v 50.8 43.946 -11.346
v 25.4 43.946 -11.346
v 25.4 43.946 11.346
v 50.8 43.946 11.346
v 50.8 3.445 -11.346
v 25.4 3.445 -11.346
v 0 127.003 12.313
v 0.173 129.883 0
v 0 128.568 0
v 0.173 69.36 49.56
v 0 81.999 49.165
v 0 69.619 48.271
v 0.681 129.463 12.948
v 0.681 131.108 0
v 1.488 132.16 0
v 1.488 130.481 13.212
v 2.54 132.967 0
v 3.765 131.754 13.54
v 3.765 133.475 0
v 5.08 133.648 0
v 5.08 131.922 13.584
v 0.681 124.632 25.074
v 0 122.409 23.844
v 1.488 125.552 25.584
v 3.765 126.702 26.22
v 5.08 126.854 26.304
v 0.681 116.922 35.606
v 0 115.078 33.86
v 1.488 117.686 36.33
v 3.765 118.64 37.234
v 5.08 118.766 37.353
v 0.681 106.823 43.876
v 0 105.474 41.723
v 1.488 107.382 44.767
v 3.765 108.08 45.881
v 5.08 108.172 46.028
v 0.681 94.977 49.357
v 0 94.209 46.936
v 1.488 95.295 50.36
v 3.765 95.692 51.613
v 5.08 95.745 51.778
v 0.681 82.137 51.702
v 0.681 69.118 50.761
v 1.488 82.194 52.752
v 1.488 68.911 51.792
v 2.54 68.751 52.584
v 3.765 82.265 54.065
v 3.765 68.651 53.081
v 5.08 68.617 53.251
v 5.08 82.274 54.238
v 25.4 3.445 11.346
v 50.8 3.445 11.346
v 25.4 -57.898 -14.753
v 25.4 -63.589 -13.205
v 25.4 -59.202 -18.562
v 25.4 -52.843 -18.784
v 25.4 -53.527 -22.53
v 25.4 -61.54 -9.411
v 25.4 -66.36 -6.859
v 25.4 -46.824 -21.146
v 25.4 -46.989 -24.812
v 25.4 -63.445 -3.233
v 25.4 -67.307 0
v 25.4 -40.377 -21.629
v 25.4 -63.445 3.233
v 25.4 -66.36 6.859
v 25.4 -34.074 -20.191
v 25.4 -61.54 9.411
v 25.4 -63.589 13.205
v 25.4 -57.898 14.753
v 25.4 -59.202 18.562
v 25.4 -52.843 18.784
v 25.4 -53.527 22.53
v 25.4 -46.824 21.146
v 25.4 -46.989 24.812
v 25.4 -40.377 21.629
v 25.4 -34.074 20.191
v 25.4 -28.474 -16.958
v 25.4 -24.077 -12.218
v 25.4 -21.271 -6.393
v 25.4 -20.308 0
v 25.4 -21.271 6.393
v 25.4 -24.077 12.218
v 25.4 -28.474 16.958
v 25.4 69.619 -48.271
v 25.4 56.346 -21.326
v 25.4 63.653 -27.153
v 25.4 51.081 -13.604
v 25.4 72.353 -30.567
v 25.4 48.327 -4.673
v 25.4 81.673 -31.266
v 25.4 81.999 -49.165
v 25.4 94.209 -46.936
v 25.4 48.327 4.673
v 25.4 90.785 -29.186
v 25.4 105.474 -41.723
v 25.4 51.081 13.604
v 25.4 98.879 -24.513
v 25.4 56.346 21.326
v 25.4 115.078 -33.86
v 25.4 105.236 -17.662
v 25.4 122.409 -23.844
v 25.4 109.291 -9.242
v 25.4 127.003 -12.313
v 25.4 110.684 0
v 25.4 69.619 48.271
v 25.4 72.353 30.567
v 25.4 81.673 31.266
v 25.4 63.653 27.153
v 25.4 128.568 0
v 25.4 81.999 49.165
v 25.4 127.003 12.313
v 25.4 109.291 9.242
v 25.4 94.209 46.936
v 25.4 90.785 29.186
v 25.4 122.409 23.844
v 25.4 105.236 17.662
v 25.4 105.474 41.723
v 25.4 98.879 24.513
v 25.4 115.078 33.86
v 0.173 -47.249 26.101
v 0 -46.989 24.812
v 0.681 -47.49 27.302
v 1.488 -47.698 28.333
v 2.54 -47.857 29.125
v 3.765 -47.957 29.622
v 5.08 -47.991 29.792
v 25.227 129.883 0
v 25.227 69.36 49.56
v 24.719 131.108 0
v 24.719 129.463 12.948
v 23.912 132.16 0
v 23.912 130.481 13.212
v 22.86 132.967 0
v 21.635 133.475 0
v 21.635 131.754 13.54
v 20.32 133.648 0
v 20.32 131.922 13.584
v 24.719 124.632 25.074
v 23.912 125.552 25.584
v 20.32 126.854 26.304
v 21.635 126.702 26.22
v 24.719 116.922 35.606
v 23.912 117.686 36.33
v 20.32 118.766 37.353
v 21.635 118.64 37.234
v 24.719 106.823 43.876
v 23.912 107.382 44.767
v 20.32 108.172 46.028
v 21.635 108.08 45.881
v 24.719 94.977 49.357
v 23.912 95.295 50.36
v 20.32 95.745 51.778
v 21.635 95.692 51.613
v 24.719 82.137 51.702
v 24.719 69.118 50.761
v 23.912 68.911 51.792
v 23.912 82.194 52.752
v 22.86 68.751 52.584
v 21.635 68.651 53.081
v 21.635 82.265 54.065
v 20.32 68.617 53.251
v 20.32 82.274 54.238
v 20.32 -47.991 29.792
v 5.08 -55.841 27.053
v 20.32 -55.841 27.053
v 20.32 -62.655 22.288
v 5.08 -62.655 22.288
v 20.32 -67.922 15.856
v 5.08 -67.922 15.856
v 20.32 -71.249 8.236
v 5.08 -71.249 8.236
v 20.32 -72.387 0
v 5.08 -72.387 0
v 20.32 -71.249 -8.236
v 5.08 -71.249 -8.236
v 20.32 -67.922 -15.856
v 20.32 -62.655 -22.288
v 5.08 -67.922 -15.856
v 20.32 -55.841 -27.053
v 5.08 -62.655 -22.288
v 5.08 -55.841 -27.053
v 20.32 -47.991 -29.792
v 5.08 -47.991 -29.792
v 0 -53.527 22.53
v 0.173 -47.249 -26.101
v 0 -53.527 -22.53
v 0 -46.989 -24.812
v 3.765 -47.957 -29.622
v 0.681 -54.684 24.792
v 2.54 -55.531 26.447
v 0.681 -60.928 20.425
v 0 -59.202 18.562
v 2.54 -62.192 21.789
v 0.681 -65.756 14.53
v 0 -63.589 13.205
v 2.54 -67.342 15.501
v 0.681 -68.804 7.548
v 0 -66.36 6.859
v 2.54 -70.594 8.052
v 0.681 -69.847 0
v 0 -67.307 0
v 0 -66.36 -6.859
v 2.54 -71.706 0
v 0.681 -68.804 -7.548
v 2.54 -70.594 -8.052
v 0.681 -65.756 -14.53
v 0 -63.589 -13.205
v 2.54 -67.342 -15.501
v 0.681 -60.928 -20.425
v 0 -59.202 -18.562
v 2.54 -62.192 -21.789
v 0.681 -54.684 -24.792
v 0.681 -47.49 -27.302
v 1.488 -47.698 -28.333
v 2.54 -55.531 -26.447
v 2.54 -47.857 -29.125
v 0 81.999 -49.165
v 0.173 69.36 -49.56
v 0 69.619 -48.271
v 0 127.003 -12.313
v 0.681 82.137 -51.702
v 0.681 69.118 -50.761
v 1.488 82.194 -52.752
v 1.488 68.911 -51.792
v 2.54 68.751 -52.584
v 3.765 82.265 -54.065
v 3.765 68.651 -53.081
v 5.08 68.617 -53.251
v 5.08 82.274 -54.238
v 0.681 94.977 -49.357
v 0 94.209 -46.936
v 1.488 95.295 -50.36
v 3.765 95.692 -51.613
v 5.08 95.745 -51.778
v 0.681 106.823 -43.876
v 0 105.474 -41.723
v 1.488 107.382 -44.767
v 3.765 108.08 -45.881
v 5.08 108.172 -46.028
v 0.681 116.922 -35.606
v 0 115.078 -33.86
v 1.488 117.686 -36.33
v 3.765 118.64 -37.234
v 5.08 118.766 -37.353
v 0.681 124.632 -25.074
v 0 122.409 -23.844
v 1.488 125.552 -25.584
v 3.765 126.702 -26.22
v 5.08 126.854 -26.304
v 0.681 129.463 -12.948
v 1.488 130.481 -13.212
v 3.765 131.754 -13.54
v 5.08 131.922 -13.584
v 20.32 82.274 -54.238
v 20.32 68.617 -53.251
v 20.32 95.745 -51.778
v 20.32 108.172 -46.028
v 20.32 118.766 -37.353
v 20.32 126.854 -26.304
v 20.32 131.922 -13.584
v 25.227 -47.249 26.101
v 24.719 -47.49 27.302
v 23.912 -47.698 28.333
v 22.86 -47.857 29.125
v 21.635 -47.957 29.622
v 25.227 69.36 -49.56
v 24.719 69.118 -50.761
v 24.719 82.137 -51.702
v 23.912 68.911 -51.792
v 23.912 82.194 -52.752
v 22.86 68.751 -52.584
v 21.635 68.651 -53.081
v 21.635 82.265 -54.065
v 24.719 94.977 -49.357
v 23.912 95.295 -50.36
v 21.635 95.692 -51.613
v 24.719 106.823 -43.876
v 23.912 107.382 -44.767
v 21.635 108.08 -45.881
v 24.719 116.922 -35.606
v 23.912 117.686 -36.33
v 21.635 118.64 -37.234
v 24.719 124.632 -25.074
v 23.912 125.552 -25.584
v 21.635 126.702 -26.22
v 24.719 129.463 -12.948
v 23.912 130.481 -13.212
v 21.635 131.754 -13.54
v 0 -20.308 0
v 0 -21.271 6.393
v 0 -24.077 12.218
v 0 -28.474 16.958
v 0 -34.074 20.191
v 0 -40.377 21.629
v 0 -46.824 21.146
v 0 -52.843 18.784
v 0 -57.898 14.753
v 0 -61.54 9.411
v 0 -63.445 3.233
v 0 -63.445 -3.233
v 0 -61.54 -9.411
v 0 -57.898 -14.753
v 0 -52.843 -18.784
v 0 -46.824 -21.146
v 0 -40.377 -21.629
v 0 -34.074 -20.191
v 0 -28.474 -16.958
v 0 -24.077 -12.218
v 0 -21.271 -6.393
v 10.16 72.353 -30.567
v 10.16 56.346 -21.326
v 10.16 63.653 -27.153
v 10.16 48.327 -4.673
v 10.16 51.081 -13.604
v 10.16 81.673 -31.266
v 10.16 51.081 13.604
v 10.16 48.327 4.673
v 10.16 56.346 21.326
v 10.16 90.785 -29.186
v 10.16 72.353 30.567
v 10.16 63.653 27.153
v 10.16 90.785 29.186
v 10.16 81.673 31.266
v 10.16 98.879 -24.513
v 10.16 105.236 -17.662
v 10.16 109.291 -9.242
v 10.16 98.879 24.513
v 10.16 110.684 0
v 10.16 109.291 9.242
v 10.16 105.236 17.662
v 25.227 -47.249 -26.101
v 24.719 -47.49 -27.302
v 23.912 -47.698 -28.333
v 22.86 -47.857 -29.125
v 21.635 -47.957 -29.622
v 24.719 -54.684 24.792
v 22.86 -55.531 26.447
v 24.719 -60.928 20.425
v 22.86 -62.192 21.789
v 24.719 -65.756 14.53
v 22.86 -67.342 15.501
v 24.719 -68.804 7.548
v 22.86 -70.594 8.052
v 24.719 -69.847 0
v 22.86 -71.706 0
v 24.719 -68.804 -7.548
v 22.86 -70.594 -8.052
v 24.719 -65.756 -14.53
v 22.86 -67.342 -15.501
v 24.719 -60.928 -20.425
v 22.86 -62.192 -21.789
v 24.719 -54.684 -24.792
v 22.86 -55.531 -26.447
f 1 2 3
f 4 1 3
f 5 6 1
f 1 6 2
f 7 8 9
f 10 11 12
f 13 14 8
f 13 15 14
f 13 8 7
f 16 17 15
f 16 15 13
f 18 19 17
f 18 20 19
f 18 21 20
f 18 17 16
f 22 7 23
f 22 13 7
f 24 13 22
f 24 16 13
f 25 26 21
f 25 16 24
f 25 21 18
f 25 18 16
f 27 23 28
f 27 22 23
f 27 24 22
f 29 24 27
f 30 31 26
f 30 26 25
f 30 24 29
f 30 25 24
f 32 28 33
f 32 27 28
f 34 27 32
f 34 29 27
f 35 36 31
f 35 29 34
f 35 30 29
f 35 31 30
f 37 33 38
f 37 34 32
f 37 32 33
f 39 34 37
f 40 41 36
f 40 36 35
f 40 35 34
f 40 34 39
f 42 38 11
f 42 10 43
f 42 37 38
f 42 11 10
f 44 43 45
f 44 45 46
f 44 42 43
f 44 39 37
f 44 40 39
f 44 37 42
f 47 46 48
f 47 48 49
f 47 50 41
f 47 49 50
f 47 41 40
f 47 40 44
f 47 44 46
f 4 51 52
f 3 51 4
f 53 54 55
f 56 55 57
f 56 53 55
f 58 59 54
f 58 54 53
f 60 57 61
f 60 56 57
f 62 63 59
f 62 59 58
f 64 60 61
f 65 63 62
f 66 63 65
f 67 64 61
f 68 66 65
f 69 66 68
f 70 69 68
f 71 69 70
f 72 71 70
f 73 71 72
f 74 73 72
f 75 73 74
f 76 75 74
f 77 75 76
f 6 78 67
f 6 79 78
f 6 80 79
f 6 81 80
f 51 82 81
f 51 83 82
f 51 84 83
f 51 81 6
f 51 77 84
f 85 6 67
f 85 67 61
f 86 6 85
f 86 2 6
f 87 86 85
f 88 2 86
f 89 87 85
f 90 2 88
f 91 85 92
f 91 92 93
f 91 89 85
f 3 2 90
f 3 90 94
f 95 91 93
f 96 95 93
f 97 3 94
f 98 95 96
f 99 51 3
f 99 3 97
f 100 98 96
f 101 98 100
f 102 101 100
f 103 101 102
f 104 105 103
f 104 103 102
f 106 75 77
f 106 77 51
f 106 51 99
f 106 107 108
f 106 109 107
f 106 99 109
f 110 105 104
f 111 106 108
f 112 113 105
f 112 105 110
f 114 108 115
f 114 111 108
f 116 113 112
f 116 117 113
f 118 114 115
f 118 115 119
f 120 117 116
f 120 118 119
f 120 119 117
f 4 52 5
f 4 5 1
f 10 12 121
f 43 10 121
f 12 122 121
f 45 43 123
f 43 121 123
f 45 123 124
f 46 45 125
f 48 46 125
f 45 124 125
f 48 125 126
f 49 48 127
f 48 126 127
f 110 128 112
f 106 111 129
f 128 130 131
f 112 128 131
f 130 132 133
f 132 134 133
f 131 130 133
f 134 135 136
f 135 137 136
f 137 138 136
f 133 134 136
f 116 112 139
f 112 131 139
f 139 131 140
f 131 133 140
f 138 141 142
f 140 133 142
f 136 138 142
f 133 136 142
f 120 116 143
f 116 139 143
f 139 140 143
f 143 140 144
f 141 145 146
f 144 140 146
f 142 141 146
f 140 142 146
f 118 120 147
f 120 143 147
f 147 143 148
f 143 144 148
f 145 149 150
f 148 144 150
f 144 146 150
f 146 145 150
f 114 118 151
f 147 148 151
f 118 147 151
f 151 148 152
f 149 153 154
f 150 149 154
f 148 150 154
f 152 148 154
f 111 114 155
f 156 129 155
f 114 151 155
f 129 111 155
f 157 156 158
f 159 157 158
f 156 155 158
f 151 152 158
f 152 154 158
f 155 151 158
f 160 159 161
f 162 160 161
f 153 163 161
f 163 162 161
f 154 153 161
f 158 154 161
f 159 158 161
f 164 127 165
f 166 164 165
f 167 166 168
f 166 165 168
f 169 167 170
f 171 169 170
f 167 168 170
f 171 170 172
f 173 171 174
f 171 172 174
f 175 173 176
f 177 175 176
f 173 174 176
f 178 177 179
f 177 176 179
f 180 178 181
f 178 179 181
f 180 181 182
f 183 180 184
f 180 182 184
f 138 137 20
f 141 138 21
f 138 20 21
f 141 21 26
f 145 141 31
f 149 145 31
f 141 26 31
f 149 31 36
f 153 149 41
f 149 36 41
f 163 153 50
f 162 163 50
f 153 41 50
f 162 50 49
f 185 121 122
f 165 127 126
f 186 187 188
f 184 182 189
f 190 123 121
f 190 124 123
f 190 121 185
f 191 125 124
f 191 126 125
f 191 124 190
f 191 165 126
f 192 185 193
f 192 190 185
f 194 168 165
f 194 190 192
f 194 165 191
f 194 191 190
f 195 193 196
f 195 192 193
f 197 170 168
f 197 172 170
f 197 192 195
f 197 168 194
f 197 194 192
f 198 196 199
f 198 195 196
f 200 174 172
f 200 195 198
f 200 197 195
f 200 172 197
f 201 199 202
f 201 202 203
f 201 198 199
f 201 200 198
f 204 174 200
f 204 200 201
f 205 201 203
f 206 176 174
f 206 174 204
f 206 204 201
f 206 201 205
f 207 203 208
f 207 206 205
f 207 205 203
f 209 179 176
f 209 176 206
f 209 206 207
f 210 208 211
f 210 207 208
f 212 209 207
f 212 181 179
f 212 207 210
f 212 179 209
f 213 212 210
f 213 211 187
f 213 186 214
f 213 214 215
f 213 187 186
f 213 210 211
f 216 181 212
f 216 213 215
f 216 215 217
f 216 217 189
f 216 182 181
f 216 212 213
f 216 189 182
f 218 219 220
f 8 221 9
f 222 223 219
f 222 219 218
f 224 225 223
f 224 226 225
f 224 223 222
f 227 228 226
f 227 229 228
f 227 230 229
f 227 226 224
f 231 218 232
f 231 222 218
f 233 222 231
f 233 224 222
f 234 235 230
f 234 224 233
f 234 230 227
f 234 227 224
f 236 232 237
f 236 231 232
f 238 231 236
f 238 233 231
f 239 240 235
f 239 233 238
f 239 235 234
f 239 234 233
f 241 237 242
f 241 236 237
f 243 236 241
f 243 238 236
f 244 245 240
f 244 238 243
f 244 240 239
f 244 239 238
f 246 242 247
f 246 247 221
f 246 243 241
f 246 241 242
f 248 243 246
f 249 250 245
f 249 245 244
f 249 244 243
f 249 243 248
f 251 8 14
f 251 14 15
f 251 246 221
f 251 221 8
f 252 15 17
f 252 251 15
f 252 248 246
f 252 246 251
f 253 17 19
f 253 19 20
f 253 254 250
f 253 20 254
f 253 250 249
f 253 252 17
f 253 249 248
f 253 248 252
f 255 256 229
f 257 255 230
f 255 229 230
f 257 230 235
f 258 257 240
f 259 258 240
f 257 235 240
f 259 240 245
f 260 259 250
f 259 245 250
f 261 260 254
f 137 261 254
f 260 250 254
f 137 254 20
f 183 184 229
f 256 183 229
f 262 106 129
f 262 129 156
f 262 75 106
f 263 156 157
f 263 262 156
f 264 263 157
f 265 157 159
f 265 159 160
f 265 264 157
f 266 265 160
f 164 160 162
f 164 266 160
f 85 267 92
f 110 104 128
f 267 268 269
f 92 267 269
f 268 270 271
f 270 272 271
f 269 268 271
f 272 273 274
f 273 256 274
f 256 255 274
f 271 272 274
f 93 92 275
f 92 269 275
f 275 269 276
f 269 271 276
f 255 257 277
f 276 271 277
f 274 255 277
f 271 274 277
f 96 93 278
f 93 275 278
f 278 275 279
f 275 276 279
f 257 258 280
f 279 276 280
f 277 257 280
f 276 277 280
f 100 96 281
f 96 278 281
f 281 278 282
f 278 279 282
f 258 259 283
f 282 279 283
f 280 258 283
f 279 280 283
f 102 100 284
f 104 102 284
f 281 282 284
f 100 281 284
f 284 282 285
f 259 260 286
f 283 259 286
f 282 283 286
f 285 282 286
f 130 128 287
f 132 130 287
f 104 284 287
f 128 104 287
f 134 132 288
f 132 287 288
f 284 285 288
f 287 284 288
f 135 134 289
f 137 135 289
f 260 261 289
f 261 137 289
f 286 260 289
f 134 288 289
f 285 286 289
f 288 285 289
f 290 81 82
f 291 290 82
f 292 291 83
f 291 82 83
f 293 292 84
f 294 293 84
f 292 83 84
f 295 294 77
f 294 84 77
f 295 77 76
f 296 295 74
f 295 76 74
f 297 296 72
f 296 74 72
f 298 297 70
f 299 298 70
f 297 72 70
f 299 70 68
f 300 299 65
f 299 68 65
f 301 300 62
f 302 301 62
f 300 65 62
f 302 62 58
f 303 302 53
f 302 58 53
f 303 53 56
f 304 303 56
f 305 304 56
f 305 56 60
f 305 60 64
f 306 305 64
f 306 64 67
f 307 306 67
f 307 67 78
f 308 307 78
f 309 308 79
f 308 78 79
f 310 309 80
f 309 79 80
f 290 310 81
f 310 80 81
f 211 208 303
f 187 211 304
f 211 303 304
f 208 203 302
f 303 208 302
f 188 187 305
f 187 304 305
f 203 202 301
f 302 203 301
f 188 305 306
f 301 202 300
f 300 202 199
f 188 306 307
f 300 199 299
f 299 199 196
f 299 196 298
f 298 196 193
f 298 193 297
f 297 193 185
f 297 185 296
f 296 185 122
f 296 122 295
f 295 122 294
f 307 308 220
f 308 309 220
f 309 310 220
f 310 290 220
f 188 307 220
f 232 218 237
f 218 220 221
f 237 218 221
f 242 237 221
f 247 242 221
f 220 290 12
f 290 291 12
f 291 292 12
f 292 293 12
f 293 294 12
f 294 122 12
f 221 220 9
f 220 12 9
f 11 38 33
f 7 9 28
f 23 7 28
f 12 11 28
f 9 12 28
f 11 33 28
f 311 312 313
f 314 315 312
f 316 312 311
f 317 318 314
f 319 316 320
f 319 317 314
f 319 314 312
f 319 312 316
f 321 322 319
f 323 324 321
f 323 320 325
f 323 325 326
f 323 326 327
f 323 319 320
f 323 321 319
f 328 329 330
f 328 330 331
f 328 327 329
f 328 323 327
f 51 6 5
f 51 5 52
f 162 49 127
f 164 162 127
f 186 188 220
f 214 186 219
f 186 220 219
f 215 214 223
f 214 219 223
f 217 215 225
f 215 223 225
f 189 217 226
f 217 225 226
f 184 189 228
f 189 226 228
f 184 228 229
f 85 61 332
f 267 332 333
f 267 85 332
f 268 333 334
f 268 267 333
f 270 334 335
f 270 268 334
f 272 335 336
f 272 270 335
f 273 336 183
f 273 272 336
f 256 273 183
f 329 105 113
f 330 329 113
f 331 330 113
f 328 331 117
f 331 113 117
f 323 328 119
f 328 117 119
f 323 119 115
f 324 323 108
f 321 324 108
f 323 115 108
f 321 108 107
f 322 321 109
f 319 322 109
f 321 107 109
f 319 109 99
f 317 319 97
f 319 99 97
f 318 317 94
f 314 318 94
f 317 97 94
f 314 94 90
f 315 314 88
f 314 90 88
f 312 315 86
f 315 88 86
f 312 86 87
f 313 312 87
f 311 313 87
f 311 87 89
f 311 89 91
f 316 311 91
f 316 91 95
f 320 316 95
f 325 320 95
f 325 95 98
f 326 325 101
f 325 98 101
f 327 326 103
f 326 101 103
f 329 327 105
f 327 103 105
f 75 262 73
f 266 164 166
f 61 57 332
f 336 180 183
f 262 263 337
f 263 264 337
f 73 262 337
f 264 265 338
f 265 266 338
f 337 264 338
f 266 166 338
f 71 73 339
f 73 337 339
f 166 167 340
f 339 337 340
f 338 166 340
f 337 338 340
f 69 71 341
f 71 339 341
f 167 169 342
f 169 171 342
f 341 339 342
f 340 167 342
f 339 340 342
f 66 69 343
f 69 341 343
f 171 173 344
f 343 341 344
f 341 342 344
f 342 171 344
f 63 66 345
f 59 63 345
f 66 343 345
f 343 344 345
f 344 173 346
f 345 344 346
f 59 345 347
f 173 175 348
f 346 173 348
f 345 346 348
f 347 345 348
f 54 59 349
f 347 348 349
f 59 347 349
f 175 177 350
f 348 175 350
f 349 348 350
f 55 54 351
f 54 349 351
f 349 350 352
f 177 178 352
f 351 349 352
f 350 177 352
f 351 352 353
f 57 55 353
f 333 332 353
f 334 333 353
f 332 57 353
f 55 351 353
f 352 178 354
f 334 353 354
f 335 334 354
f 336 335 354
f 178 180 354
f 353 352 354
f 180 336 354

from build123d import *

# Parameters (mm, degrees)
F1_DEPTH = 25.4
F3_W     = 40.501038
F3_H     = 22.692132
F4_DEPTH = 25.4
F2_R     = 31.353538
F5_DEPTH = 15.24
F6_R     = 21.689952
F7_DEPTH = 25.4
F8_R     = 5.08


with BuildPart() as f1:
    # F0 (on Right) → F1 (new body)
    with BuildSketch(Plane.YZ):
        with BuildLine():
            ThreePointArc((133.647867, 0), (113.743156, 42.025772), (68.617132, 53.250967))
            ThreePointArc((68.617132, 53.250967), (25.012127, 0), (68.617132, -53.250967))
            ThreePointArc((68.617132, -53.250967), (113.743156, -42.025772), (133.647867, 0))
        make_face()
        with BuildLine():
            ThreePointArc((-47.991263, -29.79205), (-22.744834, -23.511947), (-11.608846, 0))
            ThreePointArc((-11.608846, 0), (-22.744834, 23.511947), (-47.991263, 29.79205))
            ThreePointArc((-47.991263, 29.79205), (-72.386735, 0), (-47.991263, -29.79205))
        make_face()
        with BuildLine():
            ThreePointArc((-47.991263, 29.79205), (-22.744834, 23.511947), (-11.608846, 0))
            ThreePointArc((-11.608846, 0), (-22.744834, -23.511947), (-47.991263, -29.79205))
            Line((-47.991263, -29.79205), (68.617132, -53.250967))
            ThreePointArc((68.617132, -53.250967), (25.012127, 0), (68.617132, 53.250967))
            Line((68.617132, 53.250967), (-47.991263, 29.79205))
        make_face()
    extrude(amount=F1_DEPTH)

    # F3 (on face) → F4 (join)
    with BuildSketch(Plane.YZ.offset(25.4)):
        with Locations((23.695795, 0)):
            Rectangle(F3_W, F3_H)
    extrude(amount=F4_DEPTH)

    # F2 (on face) → F5 (cut)
    with BuildSketch(Plane.YZ.offset(25.4)):
        with Locations((79.329997, 0)):
            Circle(F2_R)
    extrude(amount=-F5_DEPTH, mode=Mode.SUBTRACT)

    # F6 (on face) → F7 (cut)
    with BuildSketch(Plane.YZ.offset(25.4)):
        with Locations((-41.99779, 0)):
            Circle(F6_R)
    extrude(amount=-F7_DEPTH, mode=Mode.SUBTRACT)

    # F8
    f8_edges = [f1.edges().sort_by_distance(p)[0] for p in [
        (0, -72.386735, 0),
        (12.7, -47.991263, -29.79205),
        (25.4, -72.386735, 0),
        (12.7, -47.991263, 29.79205),
    ]]
    fillet(f8_edges, radius=F8_R)


solid = f1.part
